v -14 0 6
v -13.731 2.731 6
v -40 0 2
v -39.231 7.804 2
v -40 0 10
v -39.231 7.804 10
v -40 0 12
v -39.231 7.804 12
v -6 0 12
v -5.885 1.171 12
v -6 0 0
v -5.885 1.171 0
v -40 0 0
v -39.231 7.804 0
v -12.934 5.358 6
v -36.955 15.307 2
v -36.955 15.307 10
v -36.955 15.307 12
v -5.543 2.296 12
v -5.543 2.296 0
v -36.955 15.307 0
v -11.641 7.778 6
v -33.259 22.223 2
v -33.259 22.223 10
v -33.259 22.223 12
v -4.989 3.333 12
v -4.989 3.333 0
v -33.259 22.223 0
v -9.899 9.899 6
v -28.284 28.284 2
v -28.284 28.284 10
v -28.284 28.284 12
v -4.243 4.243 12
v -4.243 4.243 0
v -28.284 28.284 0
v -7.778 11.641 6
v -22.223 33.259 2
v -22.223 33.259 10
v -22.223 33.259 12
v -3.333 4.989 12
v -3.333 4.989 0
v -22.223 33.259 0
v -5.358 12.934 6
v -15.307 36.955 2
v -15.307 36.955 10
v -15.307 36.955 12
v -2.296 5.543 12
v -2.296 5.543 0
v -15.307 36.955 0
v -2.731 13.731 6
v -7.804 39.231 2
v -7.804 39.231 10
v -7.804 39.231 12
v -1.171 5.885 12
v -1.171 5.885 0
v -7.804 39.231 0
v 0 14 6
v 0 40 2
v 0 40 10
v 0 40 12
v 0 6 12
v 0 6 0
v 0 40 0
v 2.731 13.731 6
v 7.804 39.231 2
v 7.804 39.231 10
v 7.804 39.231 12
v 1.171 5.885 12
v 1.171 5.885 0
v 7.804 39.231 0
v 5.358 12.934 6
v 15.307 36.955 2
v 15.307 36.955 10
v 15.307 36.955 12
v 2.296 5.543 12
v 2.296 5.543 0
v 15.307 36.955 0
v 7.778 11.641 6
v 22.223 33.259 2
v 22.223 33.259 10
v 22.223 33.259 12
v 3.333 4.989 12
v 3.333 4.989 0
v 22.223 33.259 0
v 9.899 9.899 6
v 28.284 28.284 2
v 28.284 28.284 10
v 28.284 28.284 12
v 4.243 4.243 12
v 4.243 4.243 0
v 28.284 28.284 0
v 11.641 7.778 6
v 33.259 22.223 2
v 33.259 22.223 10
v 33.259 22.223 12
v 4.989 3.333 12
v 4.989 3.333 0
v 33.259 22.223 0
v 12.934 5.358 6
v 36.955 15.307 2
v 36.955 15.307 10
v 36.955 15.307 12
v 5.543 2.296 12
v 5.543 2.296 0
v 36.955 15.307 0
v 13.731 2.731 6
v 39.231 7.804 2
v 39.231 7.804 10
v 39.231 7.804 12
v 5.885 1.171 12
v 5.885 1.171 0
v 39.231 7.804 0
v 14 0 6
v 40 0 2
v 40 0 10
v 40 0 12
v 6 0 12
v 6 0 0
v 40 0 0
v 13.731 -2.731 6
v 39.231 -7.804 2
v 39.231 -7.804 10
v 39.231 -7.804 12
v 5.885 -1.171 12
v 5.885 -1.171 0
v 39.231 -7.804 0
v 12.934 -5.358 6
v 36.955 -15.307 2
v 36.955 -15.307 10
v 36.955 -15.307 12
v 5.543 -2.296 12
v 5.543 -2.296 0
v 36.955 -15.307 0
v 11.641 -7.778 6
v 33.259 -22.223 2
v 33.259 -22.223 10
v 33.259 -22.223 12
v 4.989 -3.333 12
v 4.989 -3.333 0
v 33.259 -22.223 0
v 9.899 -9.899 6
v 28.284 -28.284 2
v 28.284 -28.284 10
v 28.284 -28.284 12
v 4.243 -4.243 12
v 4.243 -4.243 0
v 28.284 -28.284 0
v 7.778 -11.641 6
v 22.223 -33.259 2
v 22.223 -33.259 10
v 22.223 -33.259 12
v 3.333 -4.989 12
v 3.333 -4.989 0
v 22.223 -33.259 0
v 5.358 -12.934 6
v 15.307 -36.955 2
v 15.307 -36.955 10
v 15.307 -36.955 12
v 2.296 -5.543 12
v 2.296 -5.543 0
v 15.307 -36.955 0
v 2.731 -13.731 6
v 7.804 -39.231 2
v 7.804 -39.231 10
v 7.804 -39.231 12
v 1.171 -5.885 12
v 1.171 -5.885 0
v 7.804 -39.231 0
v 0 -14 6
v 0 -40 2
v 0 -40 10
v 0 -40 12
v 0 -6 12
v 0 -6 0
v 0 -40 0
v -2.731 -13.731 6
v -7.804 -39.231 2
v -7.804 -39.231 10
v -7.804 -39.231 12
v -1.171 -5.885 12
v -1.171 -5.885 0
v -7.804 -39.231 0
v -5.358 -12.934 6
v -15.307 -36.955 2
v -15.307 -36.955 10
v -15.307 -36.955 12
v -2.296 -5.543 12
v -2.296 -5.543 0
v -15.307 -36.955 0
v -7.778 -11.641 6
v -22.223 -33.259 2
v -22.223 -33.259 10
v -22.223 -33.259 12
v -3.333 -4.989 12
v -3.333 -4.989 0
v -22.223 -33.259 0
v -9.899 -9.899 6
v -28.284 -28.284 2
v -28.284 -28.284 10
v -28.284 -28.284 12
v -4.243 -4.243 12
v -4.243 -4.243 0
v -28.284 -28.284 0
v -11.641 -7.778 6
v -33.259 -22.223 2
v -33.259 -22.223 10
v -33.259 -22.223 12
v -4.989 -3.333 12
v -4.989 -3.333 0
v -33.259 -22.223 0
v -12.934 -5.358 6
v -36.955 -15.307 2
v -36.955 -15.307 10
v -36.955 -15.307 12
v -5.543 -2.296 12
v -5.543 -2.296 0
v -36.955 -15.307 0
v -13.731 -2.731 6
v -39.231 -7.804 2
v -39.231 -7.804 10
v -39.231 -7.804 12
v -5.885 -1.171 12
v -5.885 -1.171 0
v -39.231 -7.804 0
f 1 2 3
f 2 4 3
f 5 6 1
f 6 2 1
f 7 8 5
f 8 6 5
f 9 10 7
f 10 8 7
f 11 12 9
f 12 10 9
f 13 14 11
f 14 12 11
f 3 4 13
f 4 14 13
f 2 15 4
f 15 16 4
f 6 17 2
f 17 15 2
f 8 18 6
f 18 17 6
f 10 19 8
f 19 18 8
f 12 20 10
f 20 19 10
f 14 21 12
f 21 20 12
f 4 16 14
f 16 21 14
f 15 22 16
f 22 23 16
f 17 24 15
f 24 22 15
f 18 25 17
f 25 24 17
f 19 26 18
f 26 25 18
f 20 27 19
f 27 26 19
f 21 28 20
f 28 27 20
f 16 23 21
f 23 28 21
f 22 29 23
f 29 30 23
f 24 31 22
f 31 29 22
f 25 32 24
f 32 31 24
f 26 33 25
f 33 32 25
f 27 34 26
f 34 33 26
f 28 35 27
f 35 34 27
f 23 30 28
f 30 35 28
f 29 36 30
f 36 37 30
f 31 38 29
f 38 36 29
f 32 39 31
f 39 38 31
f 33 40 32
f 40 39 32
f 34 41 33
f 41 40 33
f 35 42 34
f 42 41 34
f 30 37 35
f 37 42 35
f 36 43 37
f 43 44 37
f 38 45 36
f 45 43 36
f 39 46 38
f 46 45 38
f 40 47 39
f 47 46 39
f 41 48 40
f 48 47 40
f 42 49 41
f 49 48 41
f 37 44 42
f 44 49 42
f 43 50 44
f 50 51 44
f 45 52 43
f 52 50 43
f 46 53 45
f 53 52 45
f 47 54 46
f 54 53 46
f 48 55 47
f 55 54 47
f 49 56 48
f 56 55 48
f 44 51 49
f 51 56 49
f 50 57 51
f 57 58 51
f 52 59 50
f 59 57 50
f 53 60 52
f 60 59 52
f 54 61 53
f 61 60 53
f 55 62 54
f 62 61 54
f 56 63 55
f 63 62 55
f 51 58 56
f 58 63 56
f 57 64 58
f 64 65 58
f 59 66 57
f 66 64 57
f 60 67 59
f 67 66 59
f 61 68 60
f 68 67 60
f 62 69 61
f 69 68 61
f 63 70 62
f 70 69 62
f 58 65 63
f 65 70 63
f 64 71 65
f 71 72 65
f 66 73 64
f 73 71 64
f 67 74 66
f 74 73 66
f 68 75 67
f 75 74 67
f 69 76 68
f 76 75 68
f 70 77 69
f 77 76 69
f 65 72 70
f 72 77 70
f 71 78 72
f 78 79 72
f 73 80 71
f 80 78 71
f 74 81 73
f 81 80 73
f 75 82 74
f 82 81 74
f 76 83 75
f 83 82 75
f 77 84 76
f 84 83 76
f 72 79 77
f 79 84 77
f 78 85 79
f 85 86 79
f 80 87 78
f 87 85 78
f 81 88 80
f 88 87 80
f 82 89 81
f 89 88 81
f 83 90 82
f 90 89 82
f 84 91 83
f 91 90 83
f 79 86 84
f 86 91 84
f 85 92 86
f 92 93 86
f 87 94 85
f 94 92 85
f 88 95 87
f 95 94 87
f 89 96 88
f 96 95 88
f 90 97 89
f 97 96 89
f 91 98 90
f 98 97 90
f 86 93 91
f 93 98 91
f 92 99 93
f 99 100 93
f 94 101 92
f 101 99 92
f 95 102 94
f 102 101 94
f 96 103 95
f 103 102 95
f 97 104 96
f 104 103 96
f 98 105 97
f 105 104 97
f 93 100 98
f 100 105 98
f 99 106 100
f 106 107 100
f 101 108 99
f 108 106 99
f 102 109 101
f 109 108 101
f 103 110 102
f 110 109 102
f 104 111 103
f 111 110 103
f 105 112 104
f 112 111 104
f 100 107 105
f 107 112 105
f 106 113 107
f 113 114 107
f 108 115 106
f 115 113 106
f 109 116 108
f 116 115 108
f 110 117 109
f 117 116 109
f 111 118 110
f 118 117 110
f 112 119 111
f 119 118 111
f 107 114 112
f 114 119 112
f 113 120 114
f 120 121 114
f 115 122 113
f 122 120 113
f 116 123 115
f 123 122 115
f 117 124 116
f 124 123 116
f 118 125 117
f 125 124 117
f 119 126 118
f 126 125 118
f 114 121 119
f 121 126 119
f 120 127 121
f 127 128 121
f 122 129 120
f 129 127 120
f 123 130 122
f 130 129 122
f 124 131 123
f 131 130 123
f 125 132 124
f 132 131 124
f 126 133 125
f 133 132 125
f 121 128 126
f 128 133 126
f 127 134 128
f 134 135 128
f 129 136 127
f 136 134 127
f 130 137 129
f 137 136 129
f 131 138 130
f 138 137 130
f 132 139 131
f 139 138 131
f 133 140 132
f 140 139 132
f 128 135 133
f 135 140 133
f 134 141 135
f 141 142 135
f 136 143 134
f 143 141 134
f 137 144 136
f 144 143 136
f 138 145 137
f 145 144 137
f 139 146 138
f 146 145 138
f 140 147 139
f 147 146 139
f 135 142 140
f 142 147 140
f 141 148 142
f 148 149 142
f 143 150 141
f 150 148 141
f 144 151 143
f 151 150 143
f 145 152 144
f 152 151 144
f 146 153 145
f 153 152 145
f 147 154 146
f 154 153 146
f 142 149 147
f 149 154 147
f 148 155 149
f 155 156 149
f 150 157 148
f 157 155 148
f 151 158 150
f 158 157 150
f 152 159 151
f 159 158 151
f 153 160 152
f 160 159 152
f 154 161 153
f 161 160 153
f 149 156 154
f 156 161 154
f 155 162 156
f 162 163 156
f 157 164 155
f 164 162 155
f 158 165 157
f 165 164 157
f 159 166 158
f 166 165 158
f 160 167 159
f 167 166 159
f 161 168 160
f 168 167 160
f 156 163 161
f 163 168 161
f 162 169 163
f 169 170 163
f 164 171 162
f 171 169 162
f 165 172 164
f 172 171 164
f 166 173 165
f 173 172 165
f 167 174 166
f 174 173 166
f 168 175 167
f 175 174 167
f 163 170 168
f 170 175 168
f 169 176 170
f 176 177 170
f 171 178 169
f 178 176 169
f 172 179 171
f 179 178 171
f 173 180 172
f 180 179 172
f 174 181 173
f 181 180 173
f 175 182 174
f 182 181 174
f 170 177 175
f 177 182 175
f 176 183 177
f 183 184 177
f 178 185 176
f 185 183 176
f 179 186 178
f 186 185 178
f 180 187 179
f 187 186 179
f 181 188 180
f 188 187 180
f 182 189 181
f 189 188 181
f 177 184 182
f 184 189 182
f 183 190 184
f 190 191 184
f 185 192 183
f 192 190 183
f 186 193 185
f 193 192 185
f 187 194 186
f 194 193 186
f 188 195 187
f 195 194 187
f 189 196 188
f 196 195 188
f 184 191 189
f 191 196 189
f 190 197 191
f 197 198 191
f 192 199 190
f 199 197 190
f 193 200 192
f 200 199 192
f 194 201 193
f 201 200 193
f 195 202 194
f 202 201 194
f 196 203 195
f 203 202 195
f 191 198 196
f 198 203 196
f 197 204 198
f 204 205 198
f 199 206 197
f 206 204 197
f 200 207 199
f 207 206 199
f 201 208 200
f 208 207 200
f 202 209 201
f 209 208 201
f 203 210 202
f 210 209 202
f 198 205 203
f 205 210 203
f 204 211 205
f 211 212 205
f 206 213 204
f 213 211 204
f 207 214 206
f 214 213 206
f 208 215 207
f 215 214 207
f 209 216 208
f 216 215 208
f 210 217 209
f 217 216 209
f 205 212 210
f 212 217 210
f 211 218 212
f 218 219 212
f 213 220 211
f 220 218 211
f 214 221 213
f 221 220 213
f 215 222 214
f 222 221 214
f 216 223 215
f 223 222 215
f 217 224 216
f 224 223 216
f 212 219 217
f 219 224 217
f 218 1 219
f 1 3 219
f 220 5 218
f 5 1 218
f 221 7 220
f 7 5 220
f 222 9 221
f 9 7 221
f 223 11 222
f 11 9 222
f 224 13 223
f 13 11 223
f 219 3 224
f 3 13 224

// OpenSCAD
$fn = 32;

// ----------------------------------------------------------------------
// Revolved part: V-groove pulley R40
// ----------------------------------------------------------------------

// --- parameters (mm) ---
bore_r = 6;               // bore radius
rim_r = 40;               // rim radius
rim_t = 12;               // rim width
groove_r = 14;            // groove root radius
groove_w = 4;             // groove half width
revolve_angle = 360;      // revolve sweep, degrees
fit_tol = 0.02;           // declared fit tolerance (prompt contract)
free_tol = 0.2;           // declared free tolerance (prompt contract)

bore_d = 2 * bore_r;
rim_d = 2 * rim_r;
groove_d = 2 * groove_r;

profile = [[6, 0], [40, 0], [40, 2], [14, 6], [40, 10], [40, 12], [6, 12]];  // primary outline, 7 points, counter clockwise

// --- the one profile operation ---
rotate_extrude(angle = revolve_angle) polygon(points = profile);
